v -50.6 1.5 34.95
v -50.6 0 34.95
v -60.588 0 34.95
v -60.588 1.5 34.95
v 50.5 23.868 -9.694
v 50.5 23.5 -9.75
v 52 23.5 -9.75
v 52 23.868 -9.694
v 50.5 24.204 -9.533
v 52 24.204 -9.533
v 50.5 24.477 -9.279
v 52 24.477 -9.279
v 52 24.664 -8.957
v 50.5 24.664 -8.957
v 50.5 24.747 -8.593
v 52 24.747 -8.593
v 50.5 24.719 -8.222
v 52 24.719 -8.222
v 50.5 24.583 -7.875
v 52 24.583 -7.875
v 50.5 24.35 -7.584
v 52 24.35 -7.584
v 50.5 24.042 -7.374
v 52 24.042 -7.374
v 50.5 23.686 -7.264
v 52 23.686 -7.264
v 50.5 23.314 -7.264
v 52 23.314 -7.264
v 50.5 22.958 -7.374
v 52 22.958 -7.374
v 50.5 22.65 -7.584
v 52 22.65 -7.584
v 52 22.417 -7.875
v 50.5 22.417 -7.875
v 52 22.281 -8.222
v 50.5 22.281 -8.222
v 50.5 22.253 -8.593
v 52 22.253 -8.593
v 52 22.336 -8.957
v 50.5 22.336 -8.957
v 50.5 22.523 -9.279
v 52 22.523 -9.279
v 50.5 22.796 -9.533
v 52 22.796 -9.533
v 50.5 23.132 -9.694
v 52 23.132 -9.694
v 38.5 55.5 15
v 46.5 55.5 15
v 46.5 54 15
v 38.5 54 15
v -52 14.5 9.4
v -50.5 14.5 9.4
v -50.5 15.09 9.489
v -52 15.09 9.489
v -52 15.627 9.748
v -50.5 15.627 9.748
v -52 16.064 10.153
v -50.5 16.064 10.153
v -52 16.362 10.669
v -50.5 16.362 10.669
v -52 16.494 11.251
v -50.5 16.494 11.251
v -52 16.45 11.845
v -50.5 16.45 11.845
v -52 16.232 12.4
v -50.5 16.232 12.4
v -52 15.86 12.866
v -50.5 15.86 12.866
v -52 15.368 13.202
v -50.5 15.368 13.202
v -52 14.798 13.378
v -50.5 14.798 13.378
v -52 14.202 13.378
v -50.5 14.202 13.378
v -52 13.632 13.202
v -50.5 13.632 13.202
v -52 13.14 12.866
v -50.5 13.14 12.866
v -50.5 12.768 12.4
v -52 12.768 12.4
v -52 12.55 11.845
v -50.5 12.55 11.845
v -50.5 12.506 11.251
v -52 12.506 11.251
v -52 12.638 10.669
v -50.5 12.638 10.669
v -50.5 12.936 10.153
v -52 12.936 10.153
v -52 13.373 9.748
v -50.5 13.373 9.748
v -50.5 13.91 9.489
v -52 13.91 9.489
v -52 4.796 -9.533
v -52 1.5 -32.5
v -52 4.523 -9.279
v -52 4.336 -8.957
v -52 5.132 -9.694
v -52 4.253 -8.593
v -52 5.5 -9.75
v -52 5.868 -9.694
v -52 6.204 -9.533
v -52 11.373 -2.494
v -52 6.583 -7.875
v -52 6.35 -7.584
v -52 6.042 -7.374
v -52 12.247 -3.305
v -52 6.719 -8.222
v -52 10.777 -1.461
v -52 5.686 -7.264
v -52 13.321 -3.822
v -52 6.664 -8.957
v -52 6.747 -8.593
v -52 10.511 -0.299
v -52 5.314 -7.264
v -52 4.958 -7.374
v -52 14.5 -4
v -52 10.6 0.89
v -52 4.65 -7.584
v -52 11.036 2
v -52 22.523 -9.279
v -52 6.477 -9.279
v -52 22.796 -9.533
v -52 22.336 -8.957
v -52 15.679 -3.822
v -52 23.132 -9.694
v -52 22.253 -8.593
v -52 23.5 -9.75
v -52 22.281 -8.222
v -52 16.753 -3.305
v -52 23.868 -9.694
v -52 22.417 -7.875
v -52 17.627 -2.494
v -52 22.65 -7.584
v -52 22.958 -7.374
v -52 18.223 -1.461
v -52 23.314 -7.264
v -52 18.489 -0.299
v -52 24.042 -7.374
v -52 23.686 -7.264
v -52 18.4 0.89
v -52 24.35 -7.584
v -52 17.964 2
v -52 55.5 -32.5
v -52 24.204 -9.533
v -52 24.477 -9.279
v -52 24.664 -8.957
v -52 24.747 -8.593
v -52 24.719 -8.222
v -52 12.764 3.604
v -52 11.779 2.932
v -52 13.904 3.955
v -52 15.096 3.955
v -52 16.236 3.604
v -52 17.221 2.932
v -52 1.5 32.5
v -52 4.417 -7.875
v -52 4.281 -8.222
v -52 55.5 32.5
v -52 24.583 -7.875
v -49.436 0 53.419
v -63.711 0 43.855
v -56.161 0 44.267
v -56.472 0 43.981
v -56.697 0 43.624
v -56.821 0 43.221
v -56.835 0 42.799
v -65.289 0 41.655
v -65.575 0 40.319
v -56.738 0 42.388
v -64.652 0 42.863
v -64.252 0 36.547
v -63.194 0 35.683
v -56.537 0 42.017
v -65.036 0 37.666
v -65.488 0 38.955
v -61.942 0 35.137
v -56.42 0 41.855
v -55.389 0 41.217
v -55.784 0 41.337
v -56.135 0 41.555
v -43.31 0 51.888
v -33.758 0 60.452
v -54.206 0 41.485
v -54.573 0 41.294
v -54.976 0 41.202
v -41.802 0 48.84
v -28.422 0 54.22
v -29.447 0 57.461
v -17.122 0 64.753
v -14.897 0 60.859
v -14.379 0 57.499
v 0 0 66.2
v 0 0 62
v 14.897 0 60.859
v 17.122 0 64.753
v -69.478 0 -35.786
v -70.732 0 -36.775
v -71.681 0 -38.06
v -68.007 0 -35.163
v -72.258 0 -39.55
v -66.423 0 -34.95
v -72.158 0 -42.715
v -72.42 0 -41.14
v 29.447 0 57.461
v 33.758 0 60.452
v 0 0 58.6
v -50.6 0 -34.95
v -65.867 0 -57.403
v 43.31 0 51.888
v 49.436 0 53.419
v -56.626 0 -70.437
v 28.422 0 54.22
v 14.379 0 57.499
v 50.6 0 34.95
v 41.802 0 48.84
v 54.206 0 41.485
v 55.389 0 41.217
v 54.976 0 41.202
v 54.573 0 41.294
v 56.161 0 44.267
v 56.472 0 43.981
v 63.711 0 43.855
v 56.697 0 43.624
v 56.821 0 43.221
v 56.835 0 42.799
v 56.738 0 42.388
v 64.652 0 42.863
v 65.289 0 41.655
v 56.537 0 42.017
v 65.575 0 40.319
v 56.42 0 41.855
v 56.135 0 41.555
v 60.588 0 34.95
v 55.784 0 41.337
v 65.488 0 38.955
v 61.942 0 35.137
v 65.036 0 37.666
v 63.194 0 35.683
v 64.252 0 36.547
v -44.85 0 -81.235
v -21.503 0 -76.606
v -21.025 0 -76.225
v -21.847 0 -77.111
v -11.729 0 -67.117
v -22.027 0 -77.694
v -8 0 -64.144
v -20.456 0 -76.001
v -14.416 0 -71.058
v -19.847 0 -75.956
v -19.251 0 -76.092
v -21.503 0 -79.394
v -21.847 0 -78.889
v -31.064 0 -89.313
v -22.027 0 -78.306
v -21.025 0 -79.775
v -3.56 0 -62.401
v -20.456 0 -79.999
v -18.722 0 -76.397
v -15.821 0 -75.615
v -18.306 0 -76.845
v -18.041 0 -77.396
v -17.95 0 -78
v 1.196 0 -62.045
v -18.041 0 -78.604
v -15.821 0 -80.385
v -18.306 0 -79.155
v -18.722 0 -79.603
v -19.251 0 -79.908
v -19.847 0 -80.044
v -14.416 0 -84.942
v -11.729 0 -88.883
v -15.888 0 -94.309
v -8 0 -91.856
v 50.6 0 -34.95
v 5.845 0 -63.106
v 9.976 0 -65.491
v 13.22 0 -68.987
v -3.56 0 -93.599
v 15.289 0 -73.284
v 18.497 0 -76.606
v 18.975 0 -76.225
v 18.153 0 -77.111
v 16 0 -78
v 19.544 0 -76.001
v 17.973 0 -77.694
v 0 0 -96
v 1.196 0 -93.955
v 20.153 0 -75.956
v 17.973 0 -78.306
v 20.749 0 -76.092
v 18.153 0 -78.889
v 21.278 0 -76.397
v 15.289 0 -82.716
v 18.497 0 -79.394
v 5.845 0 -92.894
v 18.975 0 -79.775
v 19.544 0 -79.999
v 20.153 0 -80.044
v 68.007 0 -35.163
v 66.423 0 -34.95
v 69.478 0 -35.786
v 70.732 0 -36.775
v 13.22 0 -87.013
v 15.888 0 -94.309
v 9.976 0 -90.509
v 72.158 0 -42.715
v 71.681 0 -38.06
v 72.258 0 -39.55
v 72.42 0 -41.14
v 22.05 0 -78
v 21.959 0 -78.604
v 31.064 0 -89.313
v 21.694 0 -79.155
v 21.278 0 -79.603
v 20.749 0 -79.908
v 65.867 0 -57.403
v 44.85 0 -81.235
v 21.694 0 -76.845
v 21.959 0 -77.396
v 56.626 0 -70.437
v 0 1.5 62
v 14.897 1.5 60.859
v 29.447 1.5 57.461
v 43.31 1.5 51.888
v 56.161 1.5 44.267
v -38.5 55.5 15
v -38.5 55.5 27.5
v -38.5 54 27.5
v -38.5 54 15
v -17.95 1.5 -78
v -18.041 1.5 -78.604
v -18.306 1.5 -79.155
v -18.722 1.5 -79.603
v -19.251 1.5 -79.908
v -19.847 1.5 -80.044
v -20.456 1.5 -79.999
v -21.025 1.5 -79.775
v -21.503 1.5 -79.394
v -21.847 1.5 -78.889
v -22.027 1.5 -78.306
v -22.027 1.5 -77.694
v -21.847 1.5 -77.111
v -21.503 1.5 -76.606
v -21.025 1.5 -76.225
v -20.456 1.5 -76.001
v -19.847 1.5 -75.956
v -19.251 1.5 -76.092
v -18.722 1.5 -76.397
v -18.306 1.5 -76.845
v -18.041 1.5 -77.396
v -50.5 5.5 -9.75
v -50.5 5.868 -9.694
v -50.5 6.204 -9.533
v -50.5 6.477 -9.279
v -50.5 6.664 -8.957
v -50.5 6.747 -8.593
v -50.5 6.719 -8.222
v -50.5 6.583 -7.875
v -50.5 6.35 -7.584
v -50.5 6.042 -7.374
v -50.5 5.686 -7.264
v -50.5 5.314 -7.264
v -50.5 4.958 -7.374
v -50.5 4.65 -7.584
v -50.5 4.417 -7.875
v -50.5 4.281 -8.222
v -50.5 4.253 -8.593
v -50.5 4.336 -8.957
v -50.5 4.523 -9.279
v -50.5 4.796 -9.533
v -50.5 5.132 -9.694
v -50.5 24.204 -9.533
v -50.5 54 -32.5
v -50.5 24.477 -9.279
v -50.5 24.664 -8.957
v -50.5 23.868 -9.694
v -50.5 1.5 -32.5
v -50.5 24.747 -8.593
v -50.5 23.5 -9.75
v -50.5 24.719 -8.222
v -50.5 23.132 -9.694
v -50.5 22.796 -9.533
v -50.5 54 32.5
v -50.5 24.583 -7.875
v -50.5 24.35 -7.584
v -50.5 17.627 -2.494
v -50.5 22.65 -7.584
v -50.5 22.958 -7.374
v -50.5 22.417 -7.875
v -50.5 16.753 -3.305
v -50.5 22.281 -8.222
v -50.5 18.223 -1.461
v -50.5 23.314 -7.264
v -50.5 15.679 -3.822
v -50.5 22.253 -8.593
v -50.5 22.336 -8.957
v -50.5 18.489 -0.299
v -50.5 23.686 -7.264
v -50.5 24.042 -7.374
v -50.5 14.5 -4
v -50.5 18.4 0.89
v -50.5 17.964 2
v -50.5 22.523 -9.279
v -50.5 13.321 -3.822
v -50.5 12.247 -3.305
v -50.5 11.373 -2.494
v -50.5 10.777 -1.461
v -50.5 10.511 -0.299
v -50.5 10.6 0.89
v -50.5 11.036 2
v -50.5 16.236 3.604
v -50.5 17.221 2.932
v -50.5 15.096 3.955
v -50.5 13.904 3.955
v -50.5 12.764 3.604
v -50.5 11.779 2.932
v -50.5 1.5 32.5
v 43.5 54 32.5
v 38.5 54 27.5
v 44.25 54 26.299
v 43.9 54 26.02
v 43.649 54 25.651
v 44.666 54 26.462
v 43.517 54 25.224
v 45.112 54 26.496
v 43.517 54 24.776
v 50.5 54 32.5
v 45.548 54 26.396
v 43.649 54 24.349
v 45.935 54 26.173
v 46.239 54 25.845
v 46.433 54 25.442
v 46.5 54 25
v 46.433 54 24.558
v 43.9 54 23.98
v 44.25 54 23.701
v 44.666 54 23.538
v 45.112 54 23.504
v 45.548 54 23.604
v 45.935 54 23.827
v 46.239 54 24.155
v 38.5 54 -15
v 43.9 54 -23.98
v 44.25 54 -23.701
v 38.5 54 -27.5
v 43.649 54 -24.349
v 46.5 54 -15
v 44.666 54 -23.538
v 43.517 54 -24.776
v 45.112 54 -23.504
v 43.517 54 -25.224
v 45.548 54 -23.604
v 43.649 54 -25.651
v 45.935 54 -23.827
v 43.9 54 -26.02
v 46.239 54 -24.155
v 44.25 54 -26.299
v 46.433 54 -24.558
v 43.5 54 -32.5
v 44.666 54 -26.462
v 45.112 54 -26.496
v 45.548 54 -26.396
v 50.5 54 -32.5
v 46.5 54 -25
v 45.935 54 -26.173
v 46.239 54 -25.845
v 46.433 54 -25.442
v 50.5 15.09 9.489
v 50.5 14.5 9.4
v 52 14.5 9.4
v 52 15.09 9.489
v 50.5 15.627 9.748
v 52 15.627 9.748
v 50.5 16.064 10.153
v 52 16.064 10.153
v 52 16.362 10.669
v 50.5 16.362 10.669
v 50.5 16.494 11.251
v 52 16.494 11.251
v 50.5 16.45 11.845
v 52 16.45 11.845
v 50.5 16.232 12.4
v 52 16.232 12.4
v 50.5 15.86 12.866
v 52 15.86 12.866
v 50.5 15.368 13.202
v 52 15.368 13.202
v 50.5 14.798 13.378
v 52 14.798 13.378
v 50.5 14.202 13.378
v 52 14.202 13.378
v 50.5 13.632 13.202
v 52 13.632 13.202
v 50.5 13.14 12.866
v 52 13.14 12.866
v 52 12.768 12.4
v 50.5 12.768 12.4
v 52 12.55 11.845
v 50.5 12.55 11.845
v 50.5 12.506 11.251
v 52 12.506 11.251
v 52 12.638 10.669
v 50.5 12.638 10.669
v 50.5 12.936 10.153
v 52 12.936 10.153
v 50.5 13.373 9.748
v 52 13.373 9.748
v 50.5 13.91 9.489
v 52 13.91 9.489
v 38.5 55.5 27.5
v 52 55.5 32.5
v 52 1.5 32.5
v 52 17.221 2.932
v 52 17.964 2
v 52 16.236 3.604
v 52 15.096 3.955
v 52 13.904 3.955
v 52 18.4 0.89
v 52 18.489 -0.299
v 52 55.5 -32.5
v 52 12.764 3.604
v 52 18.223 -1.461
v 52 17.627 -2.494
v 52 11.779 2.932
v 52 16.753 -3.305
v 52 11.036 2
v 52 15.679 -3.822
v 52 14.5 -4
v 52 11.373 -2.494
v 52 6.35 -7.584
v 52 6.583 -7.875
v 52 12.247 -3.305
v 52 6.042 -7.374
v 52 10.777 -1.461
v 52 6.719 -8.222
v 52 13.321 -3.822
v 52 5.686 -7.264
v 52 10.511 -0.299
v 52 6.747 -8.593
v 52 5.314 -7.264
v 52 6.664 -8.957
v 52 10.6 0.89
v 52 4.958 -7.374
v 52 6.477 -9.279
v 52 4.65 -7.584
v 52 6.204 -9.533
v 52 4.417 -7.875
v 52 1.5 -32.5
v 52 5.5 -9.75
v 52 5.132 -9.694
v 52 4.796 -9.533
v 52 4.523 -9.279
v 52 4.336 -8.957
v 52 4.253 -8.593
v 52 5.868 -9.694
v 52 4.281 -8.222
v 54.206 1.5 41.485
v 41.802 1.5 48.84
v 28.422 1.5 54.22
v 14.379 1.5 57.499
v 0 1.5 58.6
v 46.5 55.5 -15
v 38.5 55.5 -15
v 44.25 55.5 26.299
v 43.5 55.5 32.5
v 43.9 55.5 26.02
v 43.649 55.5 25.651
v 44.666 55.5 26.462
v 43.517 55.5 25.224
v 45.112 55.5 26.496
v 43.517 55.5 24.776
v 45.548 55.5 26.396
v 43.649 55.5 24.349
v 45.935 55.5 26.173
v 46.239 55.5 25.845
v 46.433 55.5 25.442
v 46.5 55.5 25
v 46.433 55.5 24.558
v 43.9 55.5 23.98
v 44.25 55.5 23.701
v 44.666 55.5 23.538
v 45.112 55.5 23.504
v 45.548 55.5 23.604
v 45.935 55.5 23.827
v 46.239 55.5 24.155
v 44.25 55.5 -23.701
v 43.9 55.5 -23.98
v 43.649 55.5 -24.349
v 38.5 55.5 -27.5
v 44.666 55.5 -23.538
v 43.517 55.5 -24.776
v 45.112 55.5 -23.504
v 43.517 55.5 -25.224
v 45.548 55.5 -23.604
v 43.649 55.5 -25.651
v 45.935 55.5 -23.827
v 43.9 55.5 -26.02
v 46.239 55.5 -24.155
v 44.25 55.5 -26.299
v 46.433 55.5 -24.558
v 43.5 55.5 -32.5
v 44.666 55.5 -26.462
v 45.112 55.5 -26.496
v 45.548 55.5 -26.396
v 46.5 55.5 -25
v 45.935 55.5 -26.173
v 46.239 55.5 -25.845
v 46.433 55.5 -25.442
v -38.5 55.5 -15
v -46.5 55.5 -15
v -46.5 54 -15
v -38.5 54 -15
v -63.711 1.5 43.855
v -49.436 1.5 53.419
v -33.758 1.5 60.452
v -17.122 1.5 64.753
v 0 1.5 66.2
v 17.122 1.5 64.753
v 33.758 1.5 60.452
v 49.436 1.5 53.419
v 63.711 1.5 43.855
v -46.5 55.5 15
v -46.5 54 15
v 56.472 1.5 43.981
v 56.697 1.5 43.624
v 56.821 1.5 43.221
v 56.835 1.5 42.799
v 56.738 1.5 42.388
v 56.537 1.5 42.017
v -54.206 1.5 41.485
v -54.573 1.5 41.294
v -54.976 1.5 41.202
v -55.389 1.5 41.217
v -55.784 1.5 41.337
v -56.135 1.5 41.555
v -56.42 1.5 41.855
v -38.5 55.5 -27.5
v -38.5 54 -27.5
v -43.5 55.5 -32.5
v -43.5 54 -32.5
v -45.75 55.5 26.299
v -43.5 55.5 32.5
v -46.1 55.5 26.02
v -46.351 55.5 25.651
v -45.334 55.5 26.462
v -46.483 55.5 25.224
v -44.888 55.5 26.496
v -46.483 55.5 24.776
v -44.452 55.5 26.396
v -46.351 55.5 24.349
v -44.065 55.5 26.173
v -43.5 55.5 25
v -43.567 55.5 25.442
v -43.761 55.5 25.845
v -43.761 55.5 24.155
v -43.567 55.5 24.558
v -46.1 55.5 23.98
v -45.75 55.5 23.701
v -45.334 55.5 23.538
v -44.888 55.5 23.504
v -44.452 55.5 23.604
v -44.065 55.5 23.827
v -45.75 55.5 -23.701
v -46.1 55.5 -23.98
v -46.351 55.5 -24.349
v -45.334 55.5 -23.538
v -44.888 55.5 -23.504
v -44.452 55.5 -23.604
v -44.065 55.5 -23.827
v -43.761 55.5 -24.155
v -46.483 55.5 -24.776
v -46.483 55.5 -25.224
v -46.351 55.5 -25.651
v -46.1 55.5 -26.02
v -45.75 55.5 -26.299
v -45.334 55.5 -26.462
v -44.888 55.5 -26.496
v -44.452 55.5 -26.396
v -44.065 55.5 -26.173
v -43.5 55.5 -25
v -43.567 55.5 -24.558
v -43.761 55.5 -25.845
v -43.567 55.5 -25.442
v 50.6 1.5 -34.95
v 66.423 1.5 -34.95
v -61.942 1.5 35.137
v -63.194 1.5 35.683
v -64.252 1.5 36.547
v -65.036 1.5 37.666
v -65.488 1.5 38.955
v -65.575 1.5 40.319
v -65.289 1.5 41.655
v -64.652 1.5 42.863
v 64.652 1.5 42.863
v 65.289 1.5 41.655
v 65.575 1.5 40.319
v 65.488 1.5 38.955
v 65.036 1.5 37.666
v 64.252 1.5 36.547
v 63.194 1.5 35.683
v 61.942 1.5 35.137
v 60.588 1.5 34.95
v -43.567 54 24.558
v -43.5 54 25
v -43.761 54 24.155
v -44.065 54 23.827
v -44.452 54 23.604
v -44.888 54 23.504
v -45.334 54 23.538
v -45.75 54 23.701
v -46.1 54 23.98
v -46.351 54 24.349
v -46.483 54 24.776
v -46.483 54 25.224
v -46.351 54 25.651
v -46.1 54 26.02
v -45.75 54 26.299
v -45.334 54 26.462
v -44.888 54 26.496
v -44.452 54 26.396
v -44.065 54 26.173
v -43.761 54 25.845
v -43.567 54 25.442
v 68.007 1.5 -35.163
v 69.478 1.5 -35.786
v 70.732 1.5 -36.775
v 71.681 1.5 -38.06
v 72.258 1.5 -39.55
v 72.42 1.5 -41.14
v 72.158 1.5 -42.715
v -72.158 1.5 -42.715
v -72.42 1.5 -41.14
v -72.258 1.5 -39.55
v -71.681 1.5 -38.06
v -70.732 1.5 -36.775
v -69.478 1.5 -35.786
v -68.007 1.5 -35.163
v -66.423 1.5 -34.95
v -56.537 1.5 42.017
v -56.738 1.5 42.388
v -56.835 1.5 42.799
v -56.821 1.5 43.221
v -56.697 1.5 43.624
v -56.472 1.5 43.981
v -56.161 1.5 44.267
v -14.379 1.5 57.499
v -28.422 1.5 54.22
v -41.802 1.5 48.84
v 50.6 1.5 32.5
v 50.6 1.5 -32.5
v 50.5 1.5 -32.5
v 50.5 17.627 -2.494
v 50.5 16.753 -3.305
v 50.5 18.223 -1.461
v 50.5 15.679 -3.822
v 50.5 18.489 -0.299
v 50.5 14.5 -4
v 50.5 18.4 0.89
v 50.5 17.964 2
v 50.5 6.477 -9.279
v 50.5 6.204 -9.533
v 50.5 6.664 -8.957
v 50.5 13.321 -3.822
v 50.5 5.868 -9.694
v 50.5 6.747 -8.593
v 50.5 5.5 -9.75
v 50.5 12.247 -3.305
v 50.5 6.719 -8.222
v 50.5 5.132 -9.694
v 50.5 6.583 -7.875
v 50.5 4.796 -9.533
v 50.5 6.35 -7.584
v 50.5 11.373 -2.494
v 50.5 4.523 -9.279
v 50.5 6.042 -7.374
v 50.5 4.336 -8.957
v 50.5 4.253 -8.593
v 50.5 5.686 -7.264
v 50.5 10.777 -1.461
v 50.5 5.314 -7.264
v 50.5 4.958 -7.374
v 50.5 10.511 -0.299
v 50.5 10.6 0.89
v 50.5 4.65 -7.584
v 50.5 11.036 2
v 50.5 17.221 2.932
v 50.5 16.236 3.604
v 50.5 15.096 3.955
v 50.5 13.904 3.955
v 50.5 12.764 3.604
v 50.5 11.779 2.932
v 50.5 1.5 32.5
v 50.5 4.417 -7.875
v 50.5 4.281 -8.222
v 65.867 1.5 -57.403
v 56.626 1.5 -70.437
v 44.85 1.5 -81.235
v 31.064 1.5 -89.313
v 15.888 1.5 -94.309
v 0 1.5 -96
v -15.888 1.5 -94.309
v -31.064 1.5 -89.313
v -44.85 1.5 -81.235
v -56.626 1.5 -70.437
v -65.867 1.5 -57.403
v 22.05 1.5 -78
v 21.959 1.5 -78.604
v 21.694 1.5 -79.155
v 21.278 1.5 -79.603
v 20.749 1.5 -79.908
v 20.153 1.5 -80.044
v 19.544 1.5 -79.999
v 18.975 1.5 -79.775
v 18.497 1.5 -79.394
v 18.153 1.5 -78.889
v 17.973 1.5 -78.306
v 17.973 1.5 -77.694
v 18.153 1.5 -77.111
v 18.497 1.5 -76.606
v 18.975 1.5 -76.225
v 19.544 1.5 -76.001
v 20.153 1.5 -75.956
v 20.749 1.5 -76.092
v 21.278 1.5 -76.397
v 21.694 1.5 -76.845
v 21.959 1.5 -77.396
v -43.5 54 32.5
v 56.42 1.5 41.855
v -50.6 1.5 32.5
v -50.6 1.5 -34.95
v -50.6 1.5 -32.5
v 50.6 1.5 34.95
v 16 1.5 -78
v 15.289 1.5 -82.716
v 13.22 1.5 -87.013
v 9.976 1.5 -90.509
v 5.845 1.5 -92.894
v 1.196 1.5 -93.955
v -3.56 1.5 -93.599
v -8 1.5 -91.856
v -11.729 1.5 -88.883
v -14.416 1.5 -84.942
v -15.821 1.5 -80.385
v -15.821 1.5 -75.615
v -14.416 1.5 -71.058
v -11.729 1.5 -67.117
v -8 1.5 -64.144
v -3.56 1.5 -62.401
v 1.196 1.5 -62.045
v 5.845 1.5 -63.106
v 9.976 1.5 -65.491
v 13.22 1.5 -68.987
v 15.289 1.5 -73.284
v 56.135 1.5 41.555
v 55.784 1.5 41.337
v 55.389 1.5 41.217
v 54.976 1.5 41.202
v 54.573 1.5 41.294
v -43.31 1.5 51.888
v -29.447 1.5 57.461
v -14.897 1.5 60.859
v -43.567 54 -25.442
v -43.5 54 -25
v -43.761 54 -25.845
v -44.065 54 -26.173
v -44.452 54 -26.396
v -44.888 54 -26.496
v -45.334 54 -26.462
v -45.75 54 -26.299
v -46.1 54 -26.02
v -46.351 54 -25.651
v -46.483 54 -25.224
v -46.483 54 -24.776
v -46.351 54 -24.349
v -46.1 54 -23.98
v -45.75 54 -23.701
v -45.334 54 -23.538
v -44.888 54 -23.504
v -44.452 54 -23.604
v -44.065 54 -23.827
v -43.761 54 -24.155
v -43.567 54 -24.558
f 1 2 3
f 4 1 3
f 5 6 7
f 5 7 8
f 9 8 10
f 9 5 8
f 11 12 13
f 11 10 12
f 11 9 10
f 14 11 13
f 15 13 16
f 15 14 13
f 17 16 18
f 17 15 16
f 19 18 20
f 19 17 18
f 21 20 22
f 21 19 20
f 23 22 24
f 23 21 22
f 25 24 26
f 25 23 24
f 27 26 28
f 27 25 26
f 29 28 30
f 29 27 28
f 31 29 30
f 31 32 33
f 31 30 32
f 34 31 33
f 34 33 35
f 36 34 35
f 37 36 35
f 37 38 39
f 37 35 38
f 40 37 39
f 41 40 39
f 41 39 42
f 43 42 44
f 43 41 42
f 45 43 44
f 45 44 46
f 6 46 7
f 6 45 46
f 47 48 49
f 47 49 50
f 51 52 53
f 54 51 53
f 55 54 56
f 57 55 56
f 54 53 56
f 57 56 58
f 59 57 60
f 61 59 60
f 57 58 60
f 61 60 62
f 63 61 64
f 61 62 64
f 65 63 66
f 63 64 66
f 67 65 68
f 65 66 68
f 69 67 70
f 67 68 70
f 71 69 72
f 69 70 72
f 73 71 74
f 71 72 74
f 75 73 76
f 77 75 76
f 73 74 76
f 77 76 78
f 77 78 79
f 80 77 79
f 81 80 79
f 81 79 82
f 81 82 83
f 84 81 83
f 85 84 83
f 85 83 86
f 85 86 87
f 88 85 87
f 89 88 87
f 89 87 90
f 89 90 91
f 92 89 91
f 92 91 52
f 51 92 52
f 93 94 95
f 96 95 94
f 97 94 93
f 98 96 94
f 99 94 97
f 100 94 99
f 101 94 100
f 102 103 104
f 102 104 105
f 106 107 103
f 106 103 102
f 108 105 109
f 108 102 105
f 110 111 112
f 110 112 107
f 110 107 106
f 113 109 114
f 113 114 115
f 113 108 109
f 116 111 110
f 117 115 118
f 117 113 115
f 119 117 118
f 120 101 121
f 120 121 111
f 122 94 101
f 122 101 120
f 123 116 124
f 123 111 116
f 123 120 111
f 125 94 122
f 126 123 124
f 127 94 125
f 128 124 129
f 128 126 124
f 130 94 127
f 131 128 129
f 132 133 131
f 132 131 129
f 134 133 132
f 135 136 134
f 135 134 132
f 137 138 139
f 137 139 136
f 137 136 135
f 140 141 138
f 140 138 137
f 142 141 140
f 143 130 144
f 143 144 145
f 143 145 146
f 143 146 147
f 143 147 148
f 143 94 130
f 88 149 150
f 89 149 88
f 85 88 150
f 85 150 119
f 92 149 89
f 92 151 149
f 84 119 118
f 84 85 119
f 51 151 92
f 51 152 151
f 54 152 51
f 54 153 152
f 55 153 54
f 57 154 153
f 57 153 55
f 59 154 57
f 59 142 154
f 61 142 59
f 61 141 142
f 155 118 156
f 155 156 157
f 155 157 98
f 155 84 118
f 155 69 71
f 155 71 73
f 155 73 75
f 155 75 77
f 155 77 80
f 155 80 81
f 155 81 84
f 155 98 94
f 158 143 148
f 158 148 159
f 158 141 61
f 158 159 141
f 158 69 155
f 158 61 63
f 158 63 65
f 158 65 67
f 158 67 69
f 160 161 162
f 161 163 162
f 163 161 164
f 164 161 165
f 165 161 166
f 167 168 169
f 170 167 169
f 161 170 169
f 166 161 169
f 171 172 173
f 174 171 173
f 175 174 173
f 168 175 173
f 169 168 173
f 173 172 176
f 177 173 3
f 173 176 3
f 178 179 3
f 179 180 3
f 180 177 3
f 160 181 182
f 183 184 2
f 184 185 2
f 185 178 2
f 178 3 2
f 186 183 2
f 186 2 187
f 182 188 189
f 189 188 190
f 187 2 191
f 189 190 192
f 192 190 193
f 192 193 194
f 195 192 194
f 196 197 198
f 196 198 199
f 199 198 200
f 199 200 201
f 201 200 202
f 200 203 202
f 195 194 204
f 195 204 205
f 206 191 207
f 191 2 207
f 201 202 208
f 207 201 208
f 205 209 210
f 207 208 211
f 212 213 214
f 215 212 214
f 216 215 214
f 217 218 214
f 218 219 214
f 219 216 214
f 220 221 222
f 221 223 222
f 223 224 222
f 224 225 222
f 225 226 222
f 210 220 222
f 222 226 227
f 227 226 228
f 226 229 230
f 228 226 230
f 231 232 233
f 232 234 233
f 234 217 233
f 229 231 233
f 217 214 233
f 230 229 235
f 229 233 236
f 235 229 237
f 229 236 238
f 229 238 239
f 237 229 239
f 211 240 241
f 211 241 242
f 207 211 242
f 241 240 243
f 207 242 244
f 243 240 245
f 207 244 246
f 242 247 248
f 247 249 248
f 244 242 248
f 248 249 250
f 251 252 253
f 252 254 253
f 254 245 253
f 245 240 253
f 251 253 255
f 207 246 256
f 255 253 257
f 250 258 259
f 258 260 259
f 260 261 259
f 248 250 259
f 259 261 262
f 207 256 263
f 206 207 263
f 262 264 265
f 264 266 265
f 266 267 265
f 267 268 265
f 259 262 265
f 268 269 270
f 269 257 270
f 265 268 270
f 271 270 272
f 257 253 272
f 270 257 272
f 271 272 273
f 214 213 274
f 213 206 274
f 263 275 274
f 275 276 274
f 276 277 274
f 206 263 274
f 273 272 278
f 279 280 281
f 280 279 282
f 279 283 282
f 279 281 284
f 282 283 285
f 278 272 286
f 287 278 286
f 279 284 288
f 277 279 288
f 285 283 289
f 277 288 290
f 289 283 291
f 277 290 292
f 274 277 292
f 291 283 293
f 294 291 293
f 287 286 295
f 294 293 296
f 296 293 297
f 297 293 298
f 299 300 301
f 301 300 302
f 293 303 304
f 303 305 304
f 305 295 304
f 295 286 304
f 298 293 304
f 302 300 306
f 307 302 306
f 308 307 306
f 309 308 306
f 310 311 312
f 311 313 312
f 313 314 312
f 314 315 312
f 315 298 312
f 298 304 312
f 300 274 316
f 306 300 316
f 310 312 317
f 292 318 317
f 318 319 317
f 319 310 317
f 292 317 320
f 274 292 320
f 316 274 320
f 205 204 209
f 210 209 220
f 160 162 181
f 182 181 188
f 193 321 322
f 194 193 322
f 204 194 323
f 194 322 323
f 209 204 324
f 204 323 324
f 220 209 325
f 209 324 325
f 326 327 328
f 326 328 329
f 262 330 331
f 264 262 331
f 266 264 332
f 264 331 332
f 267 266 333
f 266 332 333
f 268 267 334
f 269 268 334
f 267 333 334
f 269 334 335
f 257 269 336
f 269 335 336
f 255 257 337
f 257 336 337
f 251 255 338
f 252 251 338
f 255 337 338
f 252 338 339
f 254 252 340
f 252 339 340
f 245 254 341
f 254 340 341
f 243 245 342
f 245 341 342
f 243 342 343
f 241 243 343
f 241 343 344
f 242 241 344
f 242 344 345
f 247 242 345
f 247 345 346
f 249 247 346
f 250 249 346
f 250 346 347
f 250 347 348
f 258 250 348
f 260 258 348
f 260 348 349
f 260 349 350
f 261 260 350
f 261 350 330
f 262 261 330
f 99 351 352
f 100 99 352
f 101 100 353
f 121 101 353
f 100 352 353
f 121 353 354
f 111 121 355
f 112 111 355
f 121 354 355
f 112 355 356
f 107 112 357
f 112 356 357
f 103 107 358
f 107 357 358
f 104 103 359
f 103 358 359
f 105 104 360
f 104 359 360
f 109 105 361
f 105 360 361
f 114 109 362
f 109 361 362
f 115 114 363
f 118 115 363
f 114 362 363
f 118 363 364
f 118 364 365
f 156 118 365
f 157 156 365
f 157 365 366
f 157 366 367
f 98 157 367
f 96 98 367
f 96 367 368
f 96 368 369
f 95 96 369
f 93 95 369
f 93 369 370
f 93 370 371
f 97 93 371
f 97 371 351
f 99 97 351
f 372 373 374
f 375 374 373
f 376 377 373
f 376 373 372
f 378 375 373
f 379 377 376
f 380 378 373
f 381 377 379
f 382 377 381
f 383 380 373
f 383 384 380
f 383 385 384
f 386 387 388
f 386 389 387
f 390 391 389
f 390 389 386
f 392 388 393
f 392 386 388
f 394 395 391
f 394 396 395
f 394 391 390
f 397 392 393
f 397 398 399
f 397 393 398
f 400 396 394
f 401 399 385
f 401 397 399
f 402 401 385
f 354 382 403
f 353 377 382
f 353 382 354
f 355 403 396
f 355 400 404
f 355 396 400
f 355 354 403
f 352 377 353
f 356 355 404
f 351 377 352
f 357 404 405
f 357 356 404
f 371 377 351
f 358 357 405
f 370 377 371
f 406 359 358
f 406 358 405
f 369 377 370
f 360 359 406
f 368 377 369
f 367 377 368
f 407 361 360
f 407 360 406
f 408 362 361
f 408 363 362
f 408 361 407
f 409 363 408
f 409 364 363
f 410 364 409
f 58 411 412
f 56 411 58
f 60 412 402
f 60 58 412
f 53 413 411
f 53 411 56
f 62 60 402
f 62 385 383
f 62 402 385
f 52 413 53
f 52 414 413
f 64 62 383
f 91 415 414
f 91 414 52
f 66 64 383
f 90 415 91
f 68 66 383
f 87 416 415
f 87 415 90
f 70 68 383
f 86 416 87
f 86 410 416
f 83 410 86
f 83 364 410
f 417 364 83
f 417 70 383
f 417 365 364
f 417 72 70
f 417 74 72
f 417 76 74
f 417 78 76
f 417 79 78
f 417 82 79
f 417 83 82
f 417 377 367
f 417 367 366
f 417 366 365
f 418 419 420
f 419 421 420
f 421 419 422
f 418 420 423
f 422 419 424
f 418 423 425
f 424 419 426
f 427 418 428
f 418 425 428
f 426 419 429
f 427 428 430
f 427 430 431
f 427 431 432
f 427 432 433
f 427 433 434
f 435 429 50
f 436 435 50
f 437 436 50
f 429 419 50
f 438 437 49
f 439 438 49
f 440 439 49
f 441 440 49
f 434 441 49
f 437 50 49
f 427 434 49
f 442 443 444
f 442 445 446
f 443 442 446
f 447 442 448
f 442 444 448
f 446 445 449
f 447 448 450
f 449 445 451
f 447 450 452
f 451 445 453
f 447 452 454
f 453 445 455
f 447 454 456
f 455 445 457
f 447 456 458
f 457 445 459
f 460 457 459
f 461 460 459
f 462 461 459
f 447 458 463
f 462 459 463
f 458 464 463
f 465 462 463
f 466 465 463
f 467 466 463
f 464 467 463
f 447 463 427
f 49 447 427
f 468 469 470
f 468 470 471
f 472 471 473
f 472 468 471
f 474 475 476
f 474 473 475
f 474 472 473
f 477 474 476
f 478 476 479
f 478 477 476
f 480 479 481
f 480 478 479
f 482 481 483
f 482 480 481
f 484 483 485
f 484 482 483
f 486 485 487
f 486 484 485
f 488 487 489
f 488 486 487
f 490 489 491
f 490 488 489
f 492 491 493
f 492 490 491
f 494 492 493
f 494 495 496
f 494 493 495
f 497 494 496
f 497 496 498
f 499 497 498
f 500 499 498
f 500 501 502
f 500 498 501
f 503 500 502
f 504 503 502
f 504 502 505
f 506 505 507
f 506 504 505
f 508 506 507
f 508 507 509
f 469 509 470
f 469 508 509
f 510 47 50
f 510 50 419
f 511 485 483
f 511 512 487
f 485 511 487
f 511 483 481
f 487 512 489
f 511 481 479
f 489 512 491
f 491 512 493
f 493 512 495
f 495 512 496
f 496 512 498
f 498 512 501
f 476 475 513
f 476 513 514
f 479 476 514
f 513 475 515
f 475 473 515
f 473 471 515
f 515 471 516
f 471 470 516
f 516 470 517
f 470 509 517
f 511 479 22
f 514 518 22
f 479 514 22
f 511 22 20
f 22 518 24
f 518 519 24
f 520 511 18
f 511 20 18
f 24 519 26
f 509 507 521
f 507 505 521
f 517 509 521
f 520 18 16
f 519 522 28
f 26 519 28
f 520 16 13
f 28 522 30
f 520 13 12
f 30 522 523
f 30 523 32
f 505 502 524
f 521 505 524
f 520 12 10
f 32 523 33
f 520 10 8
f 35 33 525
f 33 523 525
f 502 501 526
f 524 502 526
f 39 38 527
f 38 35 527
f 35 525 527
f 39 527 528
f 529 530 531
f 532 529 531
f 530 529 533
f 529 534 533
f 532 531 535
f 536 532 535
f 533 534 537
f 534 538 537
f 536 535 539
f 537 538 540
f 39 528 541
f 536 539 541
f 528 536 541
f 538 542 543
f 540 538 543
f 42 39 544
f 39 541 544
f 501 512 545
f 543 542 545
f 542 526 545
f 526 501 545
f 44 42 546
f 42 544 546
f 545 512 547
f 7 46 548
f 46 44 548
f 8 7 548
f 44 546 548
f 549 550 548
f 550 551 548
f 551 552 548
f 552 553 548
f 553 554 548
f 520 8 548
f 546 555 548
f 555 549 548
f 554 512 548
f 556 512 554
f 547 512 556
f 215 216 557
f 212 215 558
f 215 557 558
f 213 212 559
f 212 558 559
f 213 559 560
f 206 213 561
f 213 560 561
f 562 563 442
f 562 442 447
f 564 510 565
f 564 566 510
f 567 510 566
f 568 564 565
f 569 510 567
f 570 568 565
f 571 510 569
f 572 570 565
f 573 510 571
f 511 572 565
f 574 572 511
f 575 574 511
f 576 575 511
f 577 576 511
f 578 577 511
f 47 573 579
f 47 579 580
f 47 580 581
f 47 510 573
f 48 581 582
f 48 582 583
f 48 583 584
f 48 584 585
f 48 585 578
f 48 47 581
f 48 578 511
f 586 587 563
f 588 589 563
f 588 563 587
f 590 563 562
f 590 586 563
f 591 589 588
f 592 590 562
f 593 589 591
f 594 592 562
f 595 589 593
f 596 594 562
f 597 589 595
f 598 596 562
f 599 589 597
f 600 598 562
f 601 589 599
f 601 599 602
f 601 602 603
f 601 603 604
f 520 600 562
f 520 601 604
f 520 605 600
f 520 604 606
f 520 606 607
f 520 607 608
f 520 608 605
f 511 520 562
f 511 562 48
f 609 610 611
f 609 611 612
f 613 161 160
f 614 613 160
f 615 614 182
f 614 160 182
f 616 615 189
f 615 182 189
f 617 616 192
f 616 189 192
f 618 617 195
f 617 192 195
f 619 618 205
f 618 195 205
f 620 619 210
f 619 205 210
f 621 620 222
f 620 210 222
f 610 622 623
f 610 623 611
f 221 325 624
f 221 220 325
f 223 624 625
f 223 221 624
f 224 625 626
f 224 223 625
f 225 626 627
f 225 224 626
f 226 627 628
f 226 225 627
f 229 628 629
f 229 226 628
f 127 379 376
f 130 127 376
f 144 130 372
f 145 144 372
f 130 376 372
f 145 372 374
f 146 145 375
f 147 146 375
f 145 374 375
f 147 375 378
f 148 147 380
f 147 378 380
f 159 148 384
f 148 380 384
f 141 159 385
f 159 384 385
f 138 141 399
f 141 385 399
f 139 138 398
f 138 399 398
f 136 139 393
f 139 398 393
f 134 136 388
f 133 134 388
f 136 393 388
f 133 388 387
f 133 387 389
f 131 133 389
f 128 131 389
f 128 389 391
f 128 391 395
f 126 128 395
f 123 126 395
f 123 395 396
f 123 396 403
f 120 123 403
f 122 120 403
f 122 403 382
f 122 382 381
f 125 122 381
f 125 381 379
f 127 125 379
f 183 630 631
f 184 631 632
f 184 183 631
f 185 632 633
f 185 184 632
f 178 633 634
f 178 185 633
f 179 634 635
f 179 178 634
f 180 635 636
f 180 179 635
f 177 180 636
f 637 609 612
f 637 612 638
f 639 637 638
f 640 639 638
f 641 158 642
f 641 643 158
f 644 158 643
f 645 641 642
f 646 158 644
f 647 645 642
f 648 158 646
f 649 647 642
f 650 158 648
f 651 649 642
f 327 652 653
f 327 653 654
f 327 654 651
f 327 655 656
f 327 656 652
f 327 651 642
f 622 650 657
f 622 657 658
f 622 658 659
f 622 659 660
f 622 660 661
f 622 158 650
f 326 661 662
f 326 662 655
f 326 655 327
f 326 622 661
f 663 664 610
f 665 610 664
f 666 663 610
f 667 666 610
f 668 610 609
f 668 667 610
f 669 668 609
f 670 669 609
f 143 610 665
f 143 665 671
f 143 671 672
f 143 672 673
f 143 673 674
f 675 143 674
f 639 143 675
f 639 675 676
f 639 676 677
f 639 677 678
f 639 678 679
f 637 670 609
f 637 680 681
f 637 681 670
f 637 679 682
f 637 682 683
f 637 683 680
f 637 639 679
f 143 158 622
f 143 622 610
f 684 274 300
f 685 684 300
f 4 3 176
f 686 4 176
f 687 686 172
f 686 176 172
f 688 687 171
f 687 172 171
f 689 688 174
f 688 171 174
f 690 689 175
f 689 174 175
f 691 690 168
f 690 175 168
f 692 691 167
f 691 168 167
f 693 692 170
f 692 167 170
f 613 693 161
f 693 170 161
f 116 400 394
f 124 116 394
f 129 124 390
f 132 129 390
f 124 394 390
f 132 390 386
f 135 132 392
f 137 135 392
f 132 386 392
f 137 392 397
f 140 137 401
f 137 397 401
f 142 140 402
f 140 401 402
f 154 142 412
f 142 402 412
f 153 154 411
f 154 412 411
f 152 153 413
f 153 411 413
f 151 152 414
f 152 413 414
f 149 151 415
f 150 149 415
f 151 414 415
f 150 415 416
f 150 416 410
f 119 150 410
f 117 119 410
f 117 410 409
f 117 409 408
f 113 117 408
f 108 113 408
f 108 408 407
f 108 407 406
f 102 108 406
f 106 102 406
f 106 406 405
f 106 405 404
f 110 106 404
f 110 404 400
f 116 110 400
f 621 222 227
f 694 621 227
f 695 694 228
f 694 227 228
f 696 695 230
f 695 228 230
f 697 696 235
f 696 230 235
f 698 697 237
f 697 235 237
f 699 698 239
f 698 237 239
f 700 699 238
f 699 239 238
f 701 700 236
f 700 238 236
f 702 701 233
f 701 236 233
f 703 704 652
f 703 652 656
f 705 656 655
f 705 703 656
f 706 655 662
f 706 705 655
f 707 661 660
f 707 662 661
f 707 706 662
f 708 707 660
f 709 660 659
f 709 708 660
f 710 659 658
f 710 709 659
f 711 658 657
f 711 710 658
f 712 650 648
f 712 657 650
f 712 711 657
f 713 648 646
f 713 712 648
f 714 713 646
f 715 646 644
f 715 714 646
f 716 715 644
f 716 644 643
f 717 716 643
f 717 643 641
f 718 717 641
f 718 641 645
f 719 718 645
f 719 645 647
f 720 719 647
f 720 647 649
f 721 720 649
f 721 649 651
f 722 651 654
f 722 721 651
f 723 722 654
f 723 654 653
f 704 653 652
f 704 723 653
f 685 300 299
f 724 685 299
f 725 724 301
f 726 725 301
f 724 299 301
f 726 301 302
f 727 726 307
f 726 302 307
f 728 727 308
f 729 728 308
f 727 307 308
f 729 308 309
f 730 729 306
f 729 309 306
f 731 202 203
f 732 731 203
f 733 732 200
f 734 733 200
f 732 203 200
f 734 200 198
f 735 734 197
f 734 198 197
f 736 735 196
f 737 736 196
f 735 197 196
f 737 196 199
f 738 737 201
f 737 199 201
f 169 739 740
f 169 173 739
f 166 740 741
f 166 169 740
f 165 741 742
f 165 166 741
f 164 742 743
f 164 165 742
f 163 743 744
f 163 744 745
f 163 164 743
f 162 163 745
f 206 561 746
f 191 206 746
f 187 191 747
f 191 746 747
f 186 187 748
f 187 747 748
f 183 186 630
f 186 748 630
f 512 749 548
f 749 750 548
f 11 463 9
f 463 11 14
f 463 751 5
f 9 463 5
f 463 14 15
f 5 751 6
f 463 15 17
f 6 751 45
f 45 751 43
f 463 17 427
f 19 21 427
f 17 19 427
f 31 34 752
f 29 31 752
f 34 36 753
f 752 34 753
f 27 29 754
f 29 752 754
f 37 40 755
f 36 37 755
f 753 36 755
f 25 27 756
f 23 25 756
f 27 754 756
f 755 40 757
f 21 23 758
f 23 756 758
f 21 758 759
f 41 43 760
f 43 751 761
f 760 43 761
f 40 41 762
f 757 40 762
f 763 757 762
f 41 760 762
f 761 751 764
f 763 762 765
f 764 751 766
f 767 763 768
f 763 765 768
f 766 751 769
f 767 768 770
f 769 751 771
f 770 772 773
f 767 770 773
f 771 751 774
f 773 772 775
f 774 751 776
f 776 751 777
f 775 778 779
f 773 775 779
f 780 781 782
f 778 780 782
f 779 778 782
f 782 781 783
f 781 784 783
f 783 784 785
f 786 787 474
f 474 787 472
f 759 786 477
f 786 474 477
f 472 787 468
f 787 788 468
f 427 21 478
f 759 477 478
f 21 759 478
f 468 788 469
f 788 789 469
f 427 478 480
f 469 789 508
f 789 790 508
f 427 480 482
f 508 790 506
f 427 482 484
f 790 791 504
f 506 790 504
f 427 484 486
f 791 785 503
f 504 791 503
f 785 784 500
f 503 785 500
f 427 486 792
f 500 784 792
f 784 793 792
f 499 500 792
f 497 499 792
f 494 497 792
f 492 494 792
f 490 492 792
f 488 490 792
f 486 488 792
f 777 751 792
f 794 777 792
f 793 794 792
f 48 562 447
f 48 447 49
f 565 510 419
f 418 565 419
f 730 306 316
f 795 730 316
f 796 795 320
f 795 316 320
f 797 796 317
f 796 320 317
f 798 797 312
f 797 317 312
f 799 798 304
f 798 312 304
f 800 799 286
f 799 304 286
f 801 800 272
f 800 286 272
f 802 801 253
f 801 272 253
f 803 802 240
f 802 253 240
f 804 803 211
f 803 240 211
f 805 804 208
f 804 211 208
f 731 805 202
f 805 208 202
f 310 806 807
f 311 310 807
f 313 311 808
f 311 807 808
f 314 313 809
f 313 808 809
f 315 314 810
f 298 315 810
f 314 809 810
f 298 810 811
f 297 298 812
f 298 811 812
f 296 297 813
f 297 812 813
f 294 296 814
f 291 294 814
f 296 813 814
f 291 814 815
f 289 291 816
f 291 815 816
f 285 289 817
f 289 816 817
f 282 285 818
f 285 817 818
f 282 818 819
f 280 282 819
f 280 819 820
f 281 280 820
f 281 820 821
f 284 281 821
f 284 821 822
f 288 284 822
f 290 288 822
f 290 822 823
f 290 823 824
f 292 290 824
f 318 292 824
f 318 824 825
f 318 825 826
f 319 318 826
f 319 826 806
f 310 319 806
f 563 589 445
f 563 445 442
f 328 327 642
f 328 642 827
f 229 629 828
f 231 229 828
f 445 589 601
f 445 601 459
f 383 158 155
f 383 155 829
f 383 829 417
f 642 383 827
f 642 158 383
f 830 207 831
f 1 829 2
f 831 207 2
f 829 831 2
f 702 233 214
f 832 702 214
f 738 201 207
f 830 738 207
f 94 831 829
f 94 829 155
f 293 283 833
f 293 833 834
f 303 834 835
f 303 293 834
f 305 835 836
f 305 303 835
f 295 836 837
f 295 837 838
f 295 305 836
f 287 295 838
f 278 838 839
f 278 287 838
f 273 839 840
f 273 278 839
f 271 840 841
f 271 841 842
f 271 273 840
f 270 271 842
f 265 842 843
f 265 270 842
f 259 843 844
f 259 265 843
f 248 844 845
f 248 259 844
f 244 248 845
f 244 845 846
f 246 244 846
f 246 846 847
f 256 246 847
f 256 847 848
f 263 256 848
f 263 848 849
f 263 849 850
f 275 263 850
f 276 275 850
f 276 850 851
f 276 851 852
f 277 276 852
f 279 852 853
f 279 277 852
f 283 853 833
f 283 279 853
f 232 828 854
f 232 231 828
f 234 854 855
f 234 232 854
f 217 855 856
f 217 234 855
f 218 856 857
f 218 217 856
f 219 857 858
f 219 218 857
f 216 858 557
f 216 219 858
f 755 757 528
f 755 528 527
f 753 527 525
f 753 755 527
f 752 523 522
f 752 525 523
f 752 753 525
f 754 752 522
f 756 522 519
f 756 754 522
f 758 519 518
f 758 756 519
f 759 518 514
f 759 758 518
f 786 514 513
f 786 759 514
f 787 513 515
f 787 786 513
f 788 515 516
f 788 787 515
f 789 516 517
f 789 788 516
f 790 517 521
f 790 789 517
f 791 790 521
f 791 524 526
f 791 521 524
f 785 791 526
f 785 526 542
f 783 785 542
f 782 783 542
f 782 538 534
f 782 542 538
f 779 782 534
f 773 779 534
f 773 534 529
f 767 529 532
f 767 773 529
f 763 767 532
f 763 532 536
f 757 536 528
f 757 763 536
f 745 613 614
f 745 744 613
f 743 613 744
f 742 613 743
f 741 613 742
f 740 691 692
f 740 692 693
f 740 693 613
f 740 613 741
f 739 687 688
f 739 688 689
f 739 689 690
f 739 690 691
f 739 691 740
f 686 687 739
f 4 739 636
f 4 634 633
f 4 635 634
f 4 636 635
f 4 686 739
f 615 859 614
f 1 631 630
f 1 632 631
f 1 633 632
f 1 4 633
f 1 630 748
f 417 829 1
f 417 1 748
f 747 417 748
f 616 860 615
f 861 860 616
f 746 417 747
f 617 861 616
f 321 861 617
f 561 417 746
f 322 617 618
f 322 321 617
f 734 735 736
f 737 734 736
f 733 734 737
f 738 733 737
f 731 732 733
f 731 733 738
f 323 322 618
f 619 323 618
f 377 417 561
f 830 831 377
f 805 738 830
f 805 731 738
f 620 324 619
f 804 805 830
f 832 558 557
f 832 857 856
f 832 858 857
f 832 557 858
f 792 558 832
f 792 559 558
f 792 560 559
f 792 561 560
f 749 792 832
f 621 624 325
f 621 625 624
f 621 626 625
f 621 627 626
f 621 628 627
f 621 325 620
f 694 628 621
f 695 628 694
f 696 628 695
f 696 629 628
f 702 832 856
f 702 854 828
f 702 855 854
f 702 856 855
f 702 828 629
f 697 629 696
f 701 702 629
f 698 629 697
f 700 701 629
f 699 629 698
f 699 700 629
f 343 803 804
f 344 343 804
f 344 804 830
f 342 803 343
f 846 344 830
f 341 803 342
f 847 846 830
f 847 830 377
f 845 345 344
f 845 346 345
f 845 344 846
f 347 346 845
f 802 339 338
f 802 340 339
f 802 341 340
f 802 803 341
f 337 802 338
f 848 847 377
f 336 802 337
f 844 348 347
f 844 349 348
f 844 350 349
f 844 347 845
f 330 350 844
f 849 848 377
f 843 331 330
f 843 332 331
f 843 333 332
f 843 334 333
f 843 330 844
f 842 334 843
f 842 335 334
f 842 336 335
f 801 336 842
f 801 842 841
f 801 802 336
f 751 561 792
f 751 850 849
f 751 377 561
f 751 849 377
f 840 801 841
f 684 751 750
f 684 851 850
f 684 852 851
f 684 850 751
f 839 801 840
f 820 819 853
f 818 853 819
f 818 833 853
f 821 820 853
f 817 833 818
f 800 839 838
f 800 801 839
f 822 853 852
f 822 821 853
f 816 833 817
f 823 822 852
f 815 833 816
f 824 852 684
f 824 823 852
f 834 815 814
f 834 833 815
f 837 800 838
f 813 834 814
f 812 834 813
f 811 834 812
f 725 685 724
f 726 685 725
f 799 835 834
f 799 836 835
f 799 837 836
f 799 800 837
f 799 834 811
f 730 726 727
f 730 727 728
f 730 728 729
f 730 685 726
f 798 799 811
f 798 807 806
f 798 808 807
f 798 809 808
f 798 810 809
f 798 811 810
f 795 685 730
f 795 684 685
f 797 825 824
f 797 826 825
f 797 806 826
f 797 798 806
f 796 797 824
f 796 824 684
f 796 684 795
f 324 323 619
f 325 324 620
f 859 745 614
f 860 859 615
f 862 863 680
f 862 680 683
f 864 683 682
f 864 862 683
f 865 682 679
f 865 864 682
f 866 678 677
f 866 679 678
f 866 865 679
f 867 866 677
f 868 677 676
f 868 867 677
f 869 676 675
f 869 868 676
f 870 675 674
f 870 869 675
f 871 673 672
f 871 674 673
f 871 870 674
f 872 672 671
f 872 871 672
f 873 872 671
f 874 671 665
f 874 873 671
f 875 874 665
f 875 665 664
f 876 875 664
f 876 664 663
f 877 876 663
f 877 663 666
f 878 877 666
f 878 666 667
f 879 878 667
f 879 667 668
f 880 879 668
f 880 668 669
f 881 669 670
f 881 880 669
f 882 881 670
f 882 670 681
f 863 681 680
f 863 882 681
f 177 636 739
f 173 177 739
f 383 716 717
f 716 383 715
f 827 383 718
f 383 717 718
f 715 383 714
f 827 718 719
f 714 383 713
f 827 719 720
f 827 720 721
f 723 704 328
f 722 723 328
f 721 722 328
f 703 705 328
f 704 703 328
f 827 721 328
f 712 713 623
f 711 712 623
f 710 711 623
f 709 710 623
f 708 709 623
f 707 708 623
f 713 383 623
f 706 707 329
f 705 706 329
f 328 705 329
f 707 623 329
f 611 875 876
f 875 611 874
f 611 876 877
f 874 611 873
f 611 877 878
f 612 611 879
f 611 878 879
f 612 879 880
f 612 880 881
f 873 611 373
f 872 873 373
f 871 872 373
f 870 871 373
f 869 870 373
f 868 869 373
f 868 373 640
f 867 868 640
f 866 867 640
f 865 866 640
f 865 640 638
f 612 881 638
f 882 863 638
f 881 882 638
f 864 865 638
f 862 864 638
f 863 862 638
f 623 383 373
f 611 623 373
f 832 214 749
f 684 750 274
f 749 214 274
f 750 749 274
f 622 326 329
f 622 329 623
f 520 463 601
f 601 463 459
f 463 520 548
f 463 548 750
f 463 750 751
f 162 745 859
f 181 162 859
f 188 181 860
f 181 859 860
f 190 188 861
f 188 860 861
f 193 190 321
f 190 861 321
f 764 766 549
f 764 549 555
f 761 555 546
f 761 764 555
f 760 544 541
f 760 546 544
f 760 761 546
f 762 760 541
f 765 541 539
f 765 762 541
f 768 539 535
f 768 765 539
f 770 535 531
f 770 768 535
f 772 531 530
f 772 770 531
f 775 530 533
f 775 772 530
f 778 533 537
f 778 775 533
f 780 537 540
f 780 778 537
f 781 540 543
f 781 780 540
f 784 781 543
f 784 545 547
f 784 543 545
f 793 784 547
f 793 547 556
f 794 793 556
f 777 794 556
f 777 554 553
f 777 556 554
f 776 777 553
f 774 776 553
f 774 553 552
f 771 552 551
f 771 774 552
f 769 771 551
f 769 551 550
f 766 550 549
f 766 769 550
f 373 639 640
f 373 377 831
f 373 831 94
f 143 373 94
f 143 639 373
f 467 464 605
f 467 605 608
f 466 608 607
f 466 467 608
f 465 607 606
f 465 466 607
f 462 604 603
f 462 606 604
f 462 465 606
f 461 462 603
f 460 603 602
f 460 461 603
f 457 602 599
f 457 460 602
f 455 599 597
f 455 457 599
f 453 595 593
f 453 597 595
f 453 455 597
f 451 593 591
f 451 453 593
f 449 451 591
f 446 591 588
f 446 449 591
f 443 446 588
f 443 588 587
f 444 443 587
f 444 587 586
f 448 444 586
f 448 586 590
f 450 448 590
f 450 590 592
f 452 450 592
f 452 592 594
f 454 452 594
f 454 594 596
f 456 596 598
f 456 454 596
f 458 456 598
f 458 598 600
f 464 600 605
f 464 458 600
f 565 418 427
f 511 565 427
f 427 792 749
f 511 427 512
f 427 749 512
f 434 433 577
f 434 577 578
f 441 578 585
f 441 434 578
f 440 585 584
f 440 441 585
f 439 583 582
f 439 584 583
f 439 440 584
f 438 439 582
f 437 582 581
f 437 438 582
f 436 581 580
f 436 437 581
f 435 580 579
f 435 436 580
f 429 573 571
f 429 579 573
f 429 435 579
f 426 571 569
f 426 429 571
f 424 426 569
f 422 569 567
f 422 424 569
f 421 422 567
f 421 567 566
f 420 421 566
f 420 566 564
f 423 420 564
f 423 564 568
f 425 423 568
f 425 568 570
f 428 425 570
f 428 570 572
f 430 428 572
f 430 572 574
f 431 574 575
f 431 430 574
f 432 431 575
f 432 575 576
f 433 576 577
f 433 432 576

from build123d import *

# Parameters (mm, degrees)
SKETCH_1_R               = 16
EXTRUDE_1_DEPTH          = 1.5
EXTRUDE_START            = 1.5
EXTRUDE_2_DEPTH          = 53.5
SKETCH_5_R               = 4
CUT_EXTRUDE_1_DEPTH      = 54
CUT_EXTRUDE_1_DEPTH_BACK = 73.423245178
EXTRUDE_START_2          = 55.5
EXTRUDE_3_DEPTH          = 1.5
CUT_EXTRUDE_START        = 50
SKETCH_9_R               = 1.5
CUT_EXTRUDE_2_DEPTH      = 6.5
SKETCH_11_R              = 2.05
CUT_EXTRUDE_3_DEPTH      = 2.5
CHAMFER_1_SIZE           = 5
SKETCH_12_R              = 2
SKETCH_12_R_2            = 1.25
CUT_EXTRUDE_4_DEPTH      = 73.423245178
CUT_EXTRUDE_4_DEPTH_BACK = 73.423245178
CUT_EXTRUDE_5_DEPTH      = 10
FILLET_1_R               = 1.6


with BuildPart() as part:
    # Эскиз1 → Бобышка-Вытянуть1 (new body)
    with BuildSketch(Plane(origin=(0, 0, 0), x_dir=(1, 0, 0), z_dir=(0, 1, 0))):
        with BuildLine():
            Line((-50.6, 34.95), (-50.6, 0))
            Line((-50.6, 0), (-50.6, -34.95))
            Line((-50.6, -34.95), (-56.797799253, -34.95))
            Line((-56.797799253, -34.95), (-60.588262065, -34.95))
            ThreePointArc((-60.588262065, -34.95), (-65.306481849, -38.29518821), (-63.711368357, -43.854639175))
            ThreePointArc((-63.711368357, -43.854639175), (0, -66.2), (63.711368357, -43.854639175))
            ThreePointArc((63.711368357, -43.854639175), (65.306481849, -38.29518821), (60.588262065, -34.95))
            Line((60.588262065, -34.95), (50.6, -34.95))
            Line((50.6, -34.95), (50.6, 0))
            Line((50.6, 0), (50.6, 34.95))
            Line((50.6, 34.95), (66.052990091, 34.95))
            Line((66.052990091, 34.95), (66.314478057, 34.95))
            Line((66.314478057, 34.95), (66.423245178, 34.95))
            ThreePointArc((66.423245178, 34.95), (71.249879914, 37.385789411), (72.157626057, 42.715467626))
            ThreePointArc((72.157626057, 42.715467626), (0, 96), (-72.157626057, 42.715467626))
            ThreePointArc((-72.157626057, 42.715467626), (-71.249879914, 37.385789411), (-66.423245178, 34.95))
            Line((-66.423245178, 34.95), (-50.6, 34.95))
        make_face()
        with Locations((0, 78)):
            Circle(SKETCH_1_R, mode=Mode.SUBTRACT)
        with BuildLine():
            Line((-50.6, 34.95), (-50.6, 0))
            Line((-50.6, 0), (-50.6, -34.95))
            Line((-50.6, -34.95), (-56.797799253, -34.95))
            Line((-56.797799253, -34.95), (-60.588262065, -34.95))
            ThreePointArc((-60.588262065, -34.95), (-65.306481849, -38.29518821), (-63.711368357, -43.854639175))
            ThreePointArc((-63.711368357, -43.854639175), (0, -66.2), (63.711368357, -43.854639175))
            ThreePointArc((63.711368357, -43.854639175), (65.306481849, -38.29518821), (60.588262065, -34.95))
            Line((60.588262065, -34.95), (50.6, -34.95))
            Line((50.6, -34.95), (50.6, 0))
            Line((50.6, 0), (50.6, 34.95))
            Line((50.6, 34.95), (66.052990091, 34.95))
            Line((66.052990091, 34.95), (66.314478057, 34.95))
            Line((66.314478057, 34.95), (66.423245178, 34.95))
            ThreePointArc((66.423245178, 34.95), (71.249879914, 37.385789411), (72.157626057, 42.715467626))
            ThreePointArc((72.157626057, 42.715467626), (0, 96), (-72.157626057, 42.715467626))
            ThreePointArc((-72.157626057, 42.715467626), (-71.249879914, 37.385789411), (-66.423245178, 34.95))
            Line((-66.423245178, 34.95), (-50.6, 34.95))
        make_face()
        with Locations((0, 78)):
            Circle(SKETCH_1_R, mode=Mode.SUBTRACT)
        with BuildLine():
            Line((-50.6, 34.95), (-50.6, 0))
            Line((-50.6, 0), (-50.6, -34.95))
            Line((-50.6, -34.95), (-56.797799253, -34.95))
            Line((-56.797799253, -34.95), (-60.588262065, -34.95))
            ThreePointArc((-60.588262065, -34.95), (-65.306481849, -38.29518821), (-63.711368357, -43.854639175))
            ThreePointArc((-63.711368357, -43.854639175), (0, -66.2), (63.711368357, -43.854639175))
            ThreePointArc((63.711368357, -43.854639175), (65.306481849, -38.29518821), (60.588262065, -34.95))
            Line((60.588262065, -34.95), (50.6, -34.95))
            Line((50.6, -34.95), (50.6, 0))
            Line((50.6, 0), (50.6, 34.95))
            Line((50.6, 34.95), (66.052990091, 34.95))
            Line((66.052990091, 34.95), (66.314478057, 34.95))
            Line((66.314478057, 34.95), (66.423245178, 34.95))
            ThreePointArc((66.423245178, 34.95), (71.249879914, 37.385789411), (72.157626057, 42.715467626))
            ThreePointArc((72.157626057, 42.715467626), (0, 96), (-72.157626057, 42.715467626))
            ThreePointArc((-72.157626057, 42.715467626), (-71.249879914, 37.385789411), (-66.423245178, 34.95))
            Line((-66.423245178, 34.95), (-50.6, 34.95))
        make_face()
        with Locations((0, 78)):
            Circle(SKETCH_1_R, mode=Mode.SUBTRACT)
    extrude(amount=EXTRUDE_1_DEPTH)

    # Эскиз3 → Бобышка-Вытянуть2 (add)
    with BuildSketch(Plane(origin=(0, 0, 0), x_dir=(1, 0, 0), z_dir=(0, 1, 0)).offset(EXTRUDE_START)):
        Polygon((-52, 0), (-52, 32.5), (-50.5, 32.5), (-50.5, -32.5), (-52, -32.5), align=None)
        Polygon((52, -32.5), (52, 0), (52, 32.5), (50.5, 32.5), (50.5, -32.5), align=None)
    extrude(amount=EXTRUDE_2_DEPTH)

    # Эскиз5 → Вырез-Вытянуть1 (cut, two sides)
    with BuildSketch(Plane(origin=(0, 0, 0), x_dir=(0, 0, -1), z_dir=(1, 0, 0))) as cut_extrude_1_sk:
        with Locations((0, 14.5)):
            Circle(SKETCH_5_R)
    extrude(amount=CUT_EXTRUDE_1_DEPTH, mode=Mode.SUBTRACT)
    extrude(cut_extrude_1_sk.sketch, amount=-CUT_EXTRUDE_1_DEPTH_BACK, mode=Mode.SUBTRACT)

    # Эскиз6 → Бобышка-Вытянуть3 (add)
    with BuildSketch(Plane(origin=(0, 0, 0), x_dir=(1, 0, 0), z_dir=(0, 1, 0)).offset(EXTRUDE_START_2)):
        Polygon((-52, 32.5), (-52, 0), (-52, -32.5), (-38.5, -32.5), (-38.5, -15), (-46.5, -15), (-46.5, 0), (-46.5, 15), (-38.5, 15), (-38.5, 32.5), align=None)
        Polygon((46.5, 0), (46.5, -15), (38.5, -15), (38.5, -32.5), (52, -32.5), (52, 0), (52, 32.5), (38.5, 32.5), (38.5, 15), (46.5, 15), align=None)
    extrude(amount=-EXTRUDE_3_DEPTH)

    # Эскиз9 → Вырез-Вытянуть2 (cut, through all)
    with BuildSketch(Plane(origin=(0, 0, 0), x_dir=(1, 0, 0), z_dir=(0, 1, 0)).offset(CUT_EXTRUDE_START)):
        with Locations((-45, 25)):
            Circle(SKETCH_9_R)
        with Locations((-45, -25)):
            Circle(SKETCH_9_R)
        with Locations((45, -25)):
            Circle(SKETCH_9_R)
        with Locations((45, 25)):
            Circle(SKETCH_9_R)
    extrude(amount=CUT_EXTRUDE_2_DEPTH, mode=Mode.SUBTRACT)

    # Эскиз11 → Вырез-Вытянуть3 (cut, through all)
    with BuildSketch(Plane(origin=(0, 1.5, 0), x_dir=(1, 0, 0), z_dir=(0, 1, 0))):
        with Locations((20, 78)):
            Circle(SKETCH_11_R)
        with Locations((-20, 78)):
            Circle(SKETCH_11_R)
    extrude(amount=-CUT_EXTRUDE_3_DEPTH, mode=Mode.SUBTRACT)

    # Фаска1
    chamfer_1_edges = [part.edges().sort_by_distance(p)[0] for p in [
        (38.5, 54.75, -32.5),
        (38.5, 54.75, 32.5),
        (-38.5, 54.75, 32.5),
        (-38.5, 54.75, -32.5),
    ]]
    chamfer(chamfer_1_edges, length=CHAMFER_1_SIZE)

    # Эскиз12 → Вырез-Вытянуть4 (cut, two sides)
    with BuildSketch(Plane(origin=(0, 0, 0), x_dir=(0, 0, -1), z_dir=(1, 0, 0))) as cut_extrude_4_sk:
        with Locations((-11.4, 14.5)):
            Circle(SKETCH_12_R)
        with Locations((8.5, 23.5)):
            Circle(SKETCH_12_R_2)
        with Locations((8.5, 5.5)):
            Circle(SKETCH_12_R_2)
    extrude(amount=CUT_EXTRUDE_4_DEPTH, mode=Mode.SUBTRACT)
    extrude(cut_extrude_4_sk.sketch, amount=-CUT_EXTRUDE_4_DEPTH_BACK, mode=Mode.SUBTRACT)

    # Эскиз13 → Вырез-Вытянуть5 (cut)
    with BuildSketch(Plane(origin=(0, 1.5, 0), x_dir=(1, 0, 0), z_dir=(0, 1, 0))):
        with BuildLine():
            Line((0, -62), (0, -58.6))
            ThreePointArc((0, -58.6), (-29.171204269, -53.979735138), (-55.486927816, -40.571204269))
            Line((-55.486927816, -40.571204269), (-57.485397674, -43.32186205))
            ThreePointArc((-57.485397674, -43.32186205), (-30.22186205, -57.213327294), (0, -62))
        make_face()
        with BuildLine():
            ThreePointArc((55.486927816, -40.571204269), (29.171204269, -53.979735138), (0, -58.6))
            Line((0, -58.6), (0, -62))
            ThreePointArc((0, -62), (30.22186205, -57.213327294), (57.485397674, -43.32186205))
            Line((57.485397674, -43.32186205), (55.486927816, -40.571204269))
        make_face()
    extrude(amount=-CUT_EXTRUDE_5_DEPTH, mode=Mode.SUBTRACT)

    # Скругление1
    fillet_1_edges = [part.edges().sort_by_distance(p)[0] for p in [
        (-55.486927816, 0.75, 40.571204269),
        (55.486927816, 0.75, 40.571204269),
        (57.485397674, 0.75, 43.32186205),
        (-57.485397674, 0.75, 43.32186205),
    ]]
    fillet(fillet_1_edges, radius=FILLET_1_R)


solid = part.part
